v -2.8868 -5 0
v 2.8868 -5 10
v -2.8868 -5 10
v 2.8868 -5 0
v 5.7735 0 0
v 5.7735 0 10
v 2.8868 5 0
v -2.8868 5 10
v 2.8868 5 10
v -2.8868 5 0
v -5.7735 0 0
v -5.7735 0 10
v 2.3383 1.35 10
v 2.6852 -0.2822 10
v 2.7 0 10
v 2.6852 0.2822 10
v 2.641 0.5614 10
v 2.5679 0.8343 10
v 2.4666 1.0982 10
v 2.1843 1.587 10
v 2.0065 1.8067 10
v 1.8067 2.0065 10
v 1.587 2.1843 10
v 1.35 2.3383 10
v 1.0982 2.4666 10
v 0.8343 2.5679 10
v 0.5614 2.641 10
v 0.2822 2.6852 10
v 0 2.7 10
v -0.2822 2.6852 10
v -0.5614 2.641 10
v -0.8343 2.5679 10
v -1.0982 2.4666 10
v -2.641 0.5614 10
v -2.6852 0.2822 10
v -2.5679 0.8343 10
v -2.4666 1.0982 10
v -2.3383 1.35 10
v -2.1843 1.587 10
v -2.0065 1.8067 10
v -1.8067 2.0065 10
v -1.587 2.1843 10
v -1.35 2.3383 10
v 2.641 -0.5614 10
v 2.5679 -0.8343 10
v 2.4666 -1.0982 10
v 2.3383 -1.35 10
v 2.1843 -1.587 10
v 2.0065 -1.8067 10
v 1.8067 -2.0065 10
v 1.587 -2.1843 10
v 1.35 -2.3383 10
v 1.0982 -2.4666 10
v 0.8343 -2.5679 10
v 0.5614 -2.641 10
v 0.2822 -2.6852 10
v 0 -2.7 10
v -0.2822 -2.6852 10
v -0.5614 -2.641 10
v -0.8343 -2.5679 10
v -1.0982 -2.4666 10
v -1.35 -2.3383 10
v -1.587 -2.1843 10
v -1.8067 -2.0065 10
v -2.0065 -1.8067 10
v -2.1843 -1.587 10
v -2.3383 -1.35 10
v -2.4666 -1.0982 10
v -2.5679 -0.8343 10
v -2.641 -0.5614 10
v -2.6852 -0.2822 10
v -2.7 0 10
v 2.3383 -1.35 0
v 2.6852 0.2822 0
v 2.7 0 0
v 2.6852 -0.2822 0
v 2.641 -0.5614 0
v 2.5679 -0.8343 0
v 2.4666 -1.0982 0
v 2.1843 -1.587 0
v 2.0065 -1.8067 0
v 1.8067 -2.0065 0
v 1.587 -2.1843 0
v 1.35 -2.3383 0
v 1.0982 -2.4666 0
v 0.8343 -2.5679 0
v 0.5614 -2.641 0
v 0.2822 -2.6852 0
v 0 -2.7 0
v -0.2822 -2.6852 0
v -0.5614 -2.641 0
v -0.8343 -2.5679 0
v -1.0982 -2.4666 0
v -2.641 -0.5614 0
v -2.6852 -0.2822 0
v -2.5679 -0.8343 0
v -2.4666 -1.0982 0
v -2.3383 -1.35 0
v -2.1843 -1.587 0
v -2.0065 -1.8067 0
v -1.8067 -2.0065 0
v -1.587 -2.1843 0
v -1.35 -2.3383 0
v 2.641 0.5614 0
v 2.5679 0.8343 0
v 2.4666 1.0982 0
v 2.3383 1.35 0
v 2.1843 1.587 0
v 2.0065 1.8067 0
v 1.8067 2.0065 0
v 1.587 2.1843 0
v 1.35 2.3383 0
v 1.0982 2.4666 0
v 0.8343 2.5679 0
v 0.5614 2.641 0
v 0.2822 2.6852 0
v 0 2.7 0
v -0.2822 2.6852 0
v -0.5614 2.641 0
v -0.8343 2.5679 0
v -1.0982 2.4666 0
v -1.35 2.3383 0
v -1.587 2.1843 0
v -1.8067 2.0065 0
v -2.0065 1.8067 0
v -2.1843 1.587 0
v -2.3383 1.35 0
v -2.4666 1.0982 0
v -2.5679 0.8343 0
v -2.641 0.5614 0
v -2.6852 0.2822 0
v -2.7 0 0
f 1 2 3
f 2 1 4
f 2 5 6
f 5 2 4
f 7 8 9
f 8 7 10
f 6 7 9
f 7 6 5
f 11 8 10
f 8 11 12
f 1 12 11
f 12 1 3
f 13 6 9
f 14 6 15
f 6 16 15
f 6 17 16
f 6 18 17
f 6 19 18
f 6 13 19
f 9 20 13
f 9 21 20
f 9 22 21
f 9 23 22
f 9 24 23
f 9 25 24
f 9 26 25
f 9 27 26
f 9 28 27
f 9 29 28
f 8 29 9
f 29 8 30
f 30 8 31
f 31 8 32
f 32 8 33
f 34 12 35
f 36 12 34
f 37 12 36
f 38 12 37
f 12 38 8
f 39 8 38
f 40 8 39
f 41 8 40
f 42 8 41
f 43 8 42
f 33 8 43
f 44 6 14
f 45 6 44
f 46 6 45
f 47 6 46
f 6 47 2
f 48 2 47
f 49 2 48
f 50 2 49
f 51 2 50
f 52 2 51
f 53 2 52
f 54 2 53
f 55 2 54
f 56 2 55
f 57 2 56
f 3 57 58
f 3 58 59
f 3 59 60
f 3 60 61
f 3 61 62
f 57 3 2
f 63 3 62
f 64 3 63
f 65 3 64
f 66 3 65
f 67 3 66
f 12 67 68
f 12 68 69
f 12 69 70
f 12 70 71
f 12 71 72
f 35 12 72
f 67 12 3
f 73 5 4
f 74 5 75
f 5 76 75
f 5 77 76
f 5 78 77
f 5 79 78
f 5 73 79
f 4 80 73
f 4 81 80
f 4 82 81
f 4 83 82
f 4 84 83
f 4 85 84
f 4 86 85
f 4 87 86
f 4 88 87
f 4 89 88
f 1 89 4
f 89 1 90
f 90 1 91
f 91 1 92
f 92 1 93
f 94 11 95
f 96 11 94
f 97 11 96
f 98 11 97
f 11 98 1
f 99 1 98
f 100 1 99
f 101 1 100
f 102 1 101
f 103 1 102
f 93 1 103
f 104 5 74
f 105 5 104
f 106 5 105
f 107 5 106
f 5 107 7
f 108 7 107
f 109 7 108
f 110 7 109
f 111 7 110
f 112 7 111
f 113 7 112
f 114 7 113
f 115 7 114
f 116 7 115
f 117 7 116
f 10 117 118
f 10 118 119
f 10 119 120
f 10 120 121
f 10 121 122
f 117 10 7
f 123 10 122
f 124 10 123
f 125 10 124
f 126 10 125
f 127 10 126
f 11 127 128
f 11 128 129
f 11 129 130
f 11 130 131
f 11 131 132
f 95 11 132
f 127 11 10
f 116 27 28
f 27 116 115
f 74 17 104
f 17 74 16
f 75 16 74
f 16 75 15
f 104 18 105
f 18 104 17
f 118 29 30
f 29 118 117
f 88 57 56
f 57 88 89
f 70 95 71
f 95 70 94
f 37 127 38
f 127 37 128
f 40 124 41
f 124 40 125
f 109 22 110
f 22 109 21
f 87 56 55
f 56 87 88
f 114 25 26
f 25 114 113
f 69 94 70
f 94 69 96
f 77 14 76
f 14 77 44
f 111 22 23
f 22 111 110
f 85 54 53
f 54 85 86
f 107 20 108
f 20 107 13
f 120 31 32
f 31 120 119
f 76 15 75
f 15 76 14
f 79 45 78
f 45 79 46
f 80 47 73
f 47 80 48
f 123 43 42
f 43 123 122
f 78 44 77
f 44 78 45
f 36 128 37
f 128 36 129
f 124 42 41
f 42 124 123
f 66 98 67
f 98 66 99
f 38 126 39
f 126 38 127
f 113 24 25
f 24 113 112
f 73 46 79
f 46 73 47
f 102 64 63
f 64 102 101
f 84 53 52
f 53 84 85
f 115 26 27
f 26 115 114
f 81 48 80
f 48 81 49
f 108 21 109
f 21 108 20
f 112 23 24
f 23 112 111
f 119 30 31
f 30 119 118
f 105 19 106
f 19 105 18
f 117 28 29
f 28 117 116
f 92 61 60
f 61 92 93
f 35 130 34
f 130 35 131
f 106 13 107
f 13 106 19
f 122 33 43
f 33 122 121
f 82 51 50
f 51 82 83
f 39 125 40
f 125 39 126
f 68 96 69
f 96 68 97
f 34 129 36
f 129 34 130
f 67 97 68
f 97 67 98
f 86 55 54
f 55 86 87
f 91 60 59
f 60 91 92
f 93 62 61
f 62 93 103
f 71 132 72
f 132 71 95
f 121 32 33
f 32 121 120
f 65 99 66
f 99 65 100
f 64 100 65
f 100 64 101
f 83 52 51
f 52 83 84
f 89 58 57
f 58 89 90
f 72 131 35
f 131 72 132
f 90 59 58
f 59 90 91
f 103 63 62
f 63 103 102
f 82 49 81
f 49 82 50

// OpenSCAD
// Hex spacer.
$fn = 60;
eps = 0.02;
inner_d = 5.4;
flat = 10;
length = 10;
difference() { cylinder(d=flat/cos(30),h=length,$fn=6); translate([0,0,-eps]) cylinder(d=inner_d,h=length+2*eps); }
